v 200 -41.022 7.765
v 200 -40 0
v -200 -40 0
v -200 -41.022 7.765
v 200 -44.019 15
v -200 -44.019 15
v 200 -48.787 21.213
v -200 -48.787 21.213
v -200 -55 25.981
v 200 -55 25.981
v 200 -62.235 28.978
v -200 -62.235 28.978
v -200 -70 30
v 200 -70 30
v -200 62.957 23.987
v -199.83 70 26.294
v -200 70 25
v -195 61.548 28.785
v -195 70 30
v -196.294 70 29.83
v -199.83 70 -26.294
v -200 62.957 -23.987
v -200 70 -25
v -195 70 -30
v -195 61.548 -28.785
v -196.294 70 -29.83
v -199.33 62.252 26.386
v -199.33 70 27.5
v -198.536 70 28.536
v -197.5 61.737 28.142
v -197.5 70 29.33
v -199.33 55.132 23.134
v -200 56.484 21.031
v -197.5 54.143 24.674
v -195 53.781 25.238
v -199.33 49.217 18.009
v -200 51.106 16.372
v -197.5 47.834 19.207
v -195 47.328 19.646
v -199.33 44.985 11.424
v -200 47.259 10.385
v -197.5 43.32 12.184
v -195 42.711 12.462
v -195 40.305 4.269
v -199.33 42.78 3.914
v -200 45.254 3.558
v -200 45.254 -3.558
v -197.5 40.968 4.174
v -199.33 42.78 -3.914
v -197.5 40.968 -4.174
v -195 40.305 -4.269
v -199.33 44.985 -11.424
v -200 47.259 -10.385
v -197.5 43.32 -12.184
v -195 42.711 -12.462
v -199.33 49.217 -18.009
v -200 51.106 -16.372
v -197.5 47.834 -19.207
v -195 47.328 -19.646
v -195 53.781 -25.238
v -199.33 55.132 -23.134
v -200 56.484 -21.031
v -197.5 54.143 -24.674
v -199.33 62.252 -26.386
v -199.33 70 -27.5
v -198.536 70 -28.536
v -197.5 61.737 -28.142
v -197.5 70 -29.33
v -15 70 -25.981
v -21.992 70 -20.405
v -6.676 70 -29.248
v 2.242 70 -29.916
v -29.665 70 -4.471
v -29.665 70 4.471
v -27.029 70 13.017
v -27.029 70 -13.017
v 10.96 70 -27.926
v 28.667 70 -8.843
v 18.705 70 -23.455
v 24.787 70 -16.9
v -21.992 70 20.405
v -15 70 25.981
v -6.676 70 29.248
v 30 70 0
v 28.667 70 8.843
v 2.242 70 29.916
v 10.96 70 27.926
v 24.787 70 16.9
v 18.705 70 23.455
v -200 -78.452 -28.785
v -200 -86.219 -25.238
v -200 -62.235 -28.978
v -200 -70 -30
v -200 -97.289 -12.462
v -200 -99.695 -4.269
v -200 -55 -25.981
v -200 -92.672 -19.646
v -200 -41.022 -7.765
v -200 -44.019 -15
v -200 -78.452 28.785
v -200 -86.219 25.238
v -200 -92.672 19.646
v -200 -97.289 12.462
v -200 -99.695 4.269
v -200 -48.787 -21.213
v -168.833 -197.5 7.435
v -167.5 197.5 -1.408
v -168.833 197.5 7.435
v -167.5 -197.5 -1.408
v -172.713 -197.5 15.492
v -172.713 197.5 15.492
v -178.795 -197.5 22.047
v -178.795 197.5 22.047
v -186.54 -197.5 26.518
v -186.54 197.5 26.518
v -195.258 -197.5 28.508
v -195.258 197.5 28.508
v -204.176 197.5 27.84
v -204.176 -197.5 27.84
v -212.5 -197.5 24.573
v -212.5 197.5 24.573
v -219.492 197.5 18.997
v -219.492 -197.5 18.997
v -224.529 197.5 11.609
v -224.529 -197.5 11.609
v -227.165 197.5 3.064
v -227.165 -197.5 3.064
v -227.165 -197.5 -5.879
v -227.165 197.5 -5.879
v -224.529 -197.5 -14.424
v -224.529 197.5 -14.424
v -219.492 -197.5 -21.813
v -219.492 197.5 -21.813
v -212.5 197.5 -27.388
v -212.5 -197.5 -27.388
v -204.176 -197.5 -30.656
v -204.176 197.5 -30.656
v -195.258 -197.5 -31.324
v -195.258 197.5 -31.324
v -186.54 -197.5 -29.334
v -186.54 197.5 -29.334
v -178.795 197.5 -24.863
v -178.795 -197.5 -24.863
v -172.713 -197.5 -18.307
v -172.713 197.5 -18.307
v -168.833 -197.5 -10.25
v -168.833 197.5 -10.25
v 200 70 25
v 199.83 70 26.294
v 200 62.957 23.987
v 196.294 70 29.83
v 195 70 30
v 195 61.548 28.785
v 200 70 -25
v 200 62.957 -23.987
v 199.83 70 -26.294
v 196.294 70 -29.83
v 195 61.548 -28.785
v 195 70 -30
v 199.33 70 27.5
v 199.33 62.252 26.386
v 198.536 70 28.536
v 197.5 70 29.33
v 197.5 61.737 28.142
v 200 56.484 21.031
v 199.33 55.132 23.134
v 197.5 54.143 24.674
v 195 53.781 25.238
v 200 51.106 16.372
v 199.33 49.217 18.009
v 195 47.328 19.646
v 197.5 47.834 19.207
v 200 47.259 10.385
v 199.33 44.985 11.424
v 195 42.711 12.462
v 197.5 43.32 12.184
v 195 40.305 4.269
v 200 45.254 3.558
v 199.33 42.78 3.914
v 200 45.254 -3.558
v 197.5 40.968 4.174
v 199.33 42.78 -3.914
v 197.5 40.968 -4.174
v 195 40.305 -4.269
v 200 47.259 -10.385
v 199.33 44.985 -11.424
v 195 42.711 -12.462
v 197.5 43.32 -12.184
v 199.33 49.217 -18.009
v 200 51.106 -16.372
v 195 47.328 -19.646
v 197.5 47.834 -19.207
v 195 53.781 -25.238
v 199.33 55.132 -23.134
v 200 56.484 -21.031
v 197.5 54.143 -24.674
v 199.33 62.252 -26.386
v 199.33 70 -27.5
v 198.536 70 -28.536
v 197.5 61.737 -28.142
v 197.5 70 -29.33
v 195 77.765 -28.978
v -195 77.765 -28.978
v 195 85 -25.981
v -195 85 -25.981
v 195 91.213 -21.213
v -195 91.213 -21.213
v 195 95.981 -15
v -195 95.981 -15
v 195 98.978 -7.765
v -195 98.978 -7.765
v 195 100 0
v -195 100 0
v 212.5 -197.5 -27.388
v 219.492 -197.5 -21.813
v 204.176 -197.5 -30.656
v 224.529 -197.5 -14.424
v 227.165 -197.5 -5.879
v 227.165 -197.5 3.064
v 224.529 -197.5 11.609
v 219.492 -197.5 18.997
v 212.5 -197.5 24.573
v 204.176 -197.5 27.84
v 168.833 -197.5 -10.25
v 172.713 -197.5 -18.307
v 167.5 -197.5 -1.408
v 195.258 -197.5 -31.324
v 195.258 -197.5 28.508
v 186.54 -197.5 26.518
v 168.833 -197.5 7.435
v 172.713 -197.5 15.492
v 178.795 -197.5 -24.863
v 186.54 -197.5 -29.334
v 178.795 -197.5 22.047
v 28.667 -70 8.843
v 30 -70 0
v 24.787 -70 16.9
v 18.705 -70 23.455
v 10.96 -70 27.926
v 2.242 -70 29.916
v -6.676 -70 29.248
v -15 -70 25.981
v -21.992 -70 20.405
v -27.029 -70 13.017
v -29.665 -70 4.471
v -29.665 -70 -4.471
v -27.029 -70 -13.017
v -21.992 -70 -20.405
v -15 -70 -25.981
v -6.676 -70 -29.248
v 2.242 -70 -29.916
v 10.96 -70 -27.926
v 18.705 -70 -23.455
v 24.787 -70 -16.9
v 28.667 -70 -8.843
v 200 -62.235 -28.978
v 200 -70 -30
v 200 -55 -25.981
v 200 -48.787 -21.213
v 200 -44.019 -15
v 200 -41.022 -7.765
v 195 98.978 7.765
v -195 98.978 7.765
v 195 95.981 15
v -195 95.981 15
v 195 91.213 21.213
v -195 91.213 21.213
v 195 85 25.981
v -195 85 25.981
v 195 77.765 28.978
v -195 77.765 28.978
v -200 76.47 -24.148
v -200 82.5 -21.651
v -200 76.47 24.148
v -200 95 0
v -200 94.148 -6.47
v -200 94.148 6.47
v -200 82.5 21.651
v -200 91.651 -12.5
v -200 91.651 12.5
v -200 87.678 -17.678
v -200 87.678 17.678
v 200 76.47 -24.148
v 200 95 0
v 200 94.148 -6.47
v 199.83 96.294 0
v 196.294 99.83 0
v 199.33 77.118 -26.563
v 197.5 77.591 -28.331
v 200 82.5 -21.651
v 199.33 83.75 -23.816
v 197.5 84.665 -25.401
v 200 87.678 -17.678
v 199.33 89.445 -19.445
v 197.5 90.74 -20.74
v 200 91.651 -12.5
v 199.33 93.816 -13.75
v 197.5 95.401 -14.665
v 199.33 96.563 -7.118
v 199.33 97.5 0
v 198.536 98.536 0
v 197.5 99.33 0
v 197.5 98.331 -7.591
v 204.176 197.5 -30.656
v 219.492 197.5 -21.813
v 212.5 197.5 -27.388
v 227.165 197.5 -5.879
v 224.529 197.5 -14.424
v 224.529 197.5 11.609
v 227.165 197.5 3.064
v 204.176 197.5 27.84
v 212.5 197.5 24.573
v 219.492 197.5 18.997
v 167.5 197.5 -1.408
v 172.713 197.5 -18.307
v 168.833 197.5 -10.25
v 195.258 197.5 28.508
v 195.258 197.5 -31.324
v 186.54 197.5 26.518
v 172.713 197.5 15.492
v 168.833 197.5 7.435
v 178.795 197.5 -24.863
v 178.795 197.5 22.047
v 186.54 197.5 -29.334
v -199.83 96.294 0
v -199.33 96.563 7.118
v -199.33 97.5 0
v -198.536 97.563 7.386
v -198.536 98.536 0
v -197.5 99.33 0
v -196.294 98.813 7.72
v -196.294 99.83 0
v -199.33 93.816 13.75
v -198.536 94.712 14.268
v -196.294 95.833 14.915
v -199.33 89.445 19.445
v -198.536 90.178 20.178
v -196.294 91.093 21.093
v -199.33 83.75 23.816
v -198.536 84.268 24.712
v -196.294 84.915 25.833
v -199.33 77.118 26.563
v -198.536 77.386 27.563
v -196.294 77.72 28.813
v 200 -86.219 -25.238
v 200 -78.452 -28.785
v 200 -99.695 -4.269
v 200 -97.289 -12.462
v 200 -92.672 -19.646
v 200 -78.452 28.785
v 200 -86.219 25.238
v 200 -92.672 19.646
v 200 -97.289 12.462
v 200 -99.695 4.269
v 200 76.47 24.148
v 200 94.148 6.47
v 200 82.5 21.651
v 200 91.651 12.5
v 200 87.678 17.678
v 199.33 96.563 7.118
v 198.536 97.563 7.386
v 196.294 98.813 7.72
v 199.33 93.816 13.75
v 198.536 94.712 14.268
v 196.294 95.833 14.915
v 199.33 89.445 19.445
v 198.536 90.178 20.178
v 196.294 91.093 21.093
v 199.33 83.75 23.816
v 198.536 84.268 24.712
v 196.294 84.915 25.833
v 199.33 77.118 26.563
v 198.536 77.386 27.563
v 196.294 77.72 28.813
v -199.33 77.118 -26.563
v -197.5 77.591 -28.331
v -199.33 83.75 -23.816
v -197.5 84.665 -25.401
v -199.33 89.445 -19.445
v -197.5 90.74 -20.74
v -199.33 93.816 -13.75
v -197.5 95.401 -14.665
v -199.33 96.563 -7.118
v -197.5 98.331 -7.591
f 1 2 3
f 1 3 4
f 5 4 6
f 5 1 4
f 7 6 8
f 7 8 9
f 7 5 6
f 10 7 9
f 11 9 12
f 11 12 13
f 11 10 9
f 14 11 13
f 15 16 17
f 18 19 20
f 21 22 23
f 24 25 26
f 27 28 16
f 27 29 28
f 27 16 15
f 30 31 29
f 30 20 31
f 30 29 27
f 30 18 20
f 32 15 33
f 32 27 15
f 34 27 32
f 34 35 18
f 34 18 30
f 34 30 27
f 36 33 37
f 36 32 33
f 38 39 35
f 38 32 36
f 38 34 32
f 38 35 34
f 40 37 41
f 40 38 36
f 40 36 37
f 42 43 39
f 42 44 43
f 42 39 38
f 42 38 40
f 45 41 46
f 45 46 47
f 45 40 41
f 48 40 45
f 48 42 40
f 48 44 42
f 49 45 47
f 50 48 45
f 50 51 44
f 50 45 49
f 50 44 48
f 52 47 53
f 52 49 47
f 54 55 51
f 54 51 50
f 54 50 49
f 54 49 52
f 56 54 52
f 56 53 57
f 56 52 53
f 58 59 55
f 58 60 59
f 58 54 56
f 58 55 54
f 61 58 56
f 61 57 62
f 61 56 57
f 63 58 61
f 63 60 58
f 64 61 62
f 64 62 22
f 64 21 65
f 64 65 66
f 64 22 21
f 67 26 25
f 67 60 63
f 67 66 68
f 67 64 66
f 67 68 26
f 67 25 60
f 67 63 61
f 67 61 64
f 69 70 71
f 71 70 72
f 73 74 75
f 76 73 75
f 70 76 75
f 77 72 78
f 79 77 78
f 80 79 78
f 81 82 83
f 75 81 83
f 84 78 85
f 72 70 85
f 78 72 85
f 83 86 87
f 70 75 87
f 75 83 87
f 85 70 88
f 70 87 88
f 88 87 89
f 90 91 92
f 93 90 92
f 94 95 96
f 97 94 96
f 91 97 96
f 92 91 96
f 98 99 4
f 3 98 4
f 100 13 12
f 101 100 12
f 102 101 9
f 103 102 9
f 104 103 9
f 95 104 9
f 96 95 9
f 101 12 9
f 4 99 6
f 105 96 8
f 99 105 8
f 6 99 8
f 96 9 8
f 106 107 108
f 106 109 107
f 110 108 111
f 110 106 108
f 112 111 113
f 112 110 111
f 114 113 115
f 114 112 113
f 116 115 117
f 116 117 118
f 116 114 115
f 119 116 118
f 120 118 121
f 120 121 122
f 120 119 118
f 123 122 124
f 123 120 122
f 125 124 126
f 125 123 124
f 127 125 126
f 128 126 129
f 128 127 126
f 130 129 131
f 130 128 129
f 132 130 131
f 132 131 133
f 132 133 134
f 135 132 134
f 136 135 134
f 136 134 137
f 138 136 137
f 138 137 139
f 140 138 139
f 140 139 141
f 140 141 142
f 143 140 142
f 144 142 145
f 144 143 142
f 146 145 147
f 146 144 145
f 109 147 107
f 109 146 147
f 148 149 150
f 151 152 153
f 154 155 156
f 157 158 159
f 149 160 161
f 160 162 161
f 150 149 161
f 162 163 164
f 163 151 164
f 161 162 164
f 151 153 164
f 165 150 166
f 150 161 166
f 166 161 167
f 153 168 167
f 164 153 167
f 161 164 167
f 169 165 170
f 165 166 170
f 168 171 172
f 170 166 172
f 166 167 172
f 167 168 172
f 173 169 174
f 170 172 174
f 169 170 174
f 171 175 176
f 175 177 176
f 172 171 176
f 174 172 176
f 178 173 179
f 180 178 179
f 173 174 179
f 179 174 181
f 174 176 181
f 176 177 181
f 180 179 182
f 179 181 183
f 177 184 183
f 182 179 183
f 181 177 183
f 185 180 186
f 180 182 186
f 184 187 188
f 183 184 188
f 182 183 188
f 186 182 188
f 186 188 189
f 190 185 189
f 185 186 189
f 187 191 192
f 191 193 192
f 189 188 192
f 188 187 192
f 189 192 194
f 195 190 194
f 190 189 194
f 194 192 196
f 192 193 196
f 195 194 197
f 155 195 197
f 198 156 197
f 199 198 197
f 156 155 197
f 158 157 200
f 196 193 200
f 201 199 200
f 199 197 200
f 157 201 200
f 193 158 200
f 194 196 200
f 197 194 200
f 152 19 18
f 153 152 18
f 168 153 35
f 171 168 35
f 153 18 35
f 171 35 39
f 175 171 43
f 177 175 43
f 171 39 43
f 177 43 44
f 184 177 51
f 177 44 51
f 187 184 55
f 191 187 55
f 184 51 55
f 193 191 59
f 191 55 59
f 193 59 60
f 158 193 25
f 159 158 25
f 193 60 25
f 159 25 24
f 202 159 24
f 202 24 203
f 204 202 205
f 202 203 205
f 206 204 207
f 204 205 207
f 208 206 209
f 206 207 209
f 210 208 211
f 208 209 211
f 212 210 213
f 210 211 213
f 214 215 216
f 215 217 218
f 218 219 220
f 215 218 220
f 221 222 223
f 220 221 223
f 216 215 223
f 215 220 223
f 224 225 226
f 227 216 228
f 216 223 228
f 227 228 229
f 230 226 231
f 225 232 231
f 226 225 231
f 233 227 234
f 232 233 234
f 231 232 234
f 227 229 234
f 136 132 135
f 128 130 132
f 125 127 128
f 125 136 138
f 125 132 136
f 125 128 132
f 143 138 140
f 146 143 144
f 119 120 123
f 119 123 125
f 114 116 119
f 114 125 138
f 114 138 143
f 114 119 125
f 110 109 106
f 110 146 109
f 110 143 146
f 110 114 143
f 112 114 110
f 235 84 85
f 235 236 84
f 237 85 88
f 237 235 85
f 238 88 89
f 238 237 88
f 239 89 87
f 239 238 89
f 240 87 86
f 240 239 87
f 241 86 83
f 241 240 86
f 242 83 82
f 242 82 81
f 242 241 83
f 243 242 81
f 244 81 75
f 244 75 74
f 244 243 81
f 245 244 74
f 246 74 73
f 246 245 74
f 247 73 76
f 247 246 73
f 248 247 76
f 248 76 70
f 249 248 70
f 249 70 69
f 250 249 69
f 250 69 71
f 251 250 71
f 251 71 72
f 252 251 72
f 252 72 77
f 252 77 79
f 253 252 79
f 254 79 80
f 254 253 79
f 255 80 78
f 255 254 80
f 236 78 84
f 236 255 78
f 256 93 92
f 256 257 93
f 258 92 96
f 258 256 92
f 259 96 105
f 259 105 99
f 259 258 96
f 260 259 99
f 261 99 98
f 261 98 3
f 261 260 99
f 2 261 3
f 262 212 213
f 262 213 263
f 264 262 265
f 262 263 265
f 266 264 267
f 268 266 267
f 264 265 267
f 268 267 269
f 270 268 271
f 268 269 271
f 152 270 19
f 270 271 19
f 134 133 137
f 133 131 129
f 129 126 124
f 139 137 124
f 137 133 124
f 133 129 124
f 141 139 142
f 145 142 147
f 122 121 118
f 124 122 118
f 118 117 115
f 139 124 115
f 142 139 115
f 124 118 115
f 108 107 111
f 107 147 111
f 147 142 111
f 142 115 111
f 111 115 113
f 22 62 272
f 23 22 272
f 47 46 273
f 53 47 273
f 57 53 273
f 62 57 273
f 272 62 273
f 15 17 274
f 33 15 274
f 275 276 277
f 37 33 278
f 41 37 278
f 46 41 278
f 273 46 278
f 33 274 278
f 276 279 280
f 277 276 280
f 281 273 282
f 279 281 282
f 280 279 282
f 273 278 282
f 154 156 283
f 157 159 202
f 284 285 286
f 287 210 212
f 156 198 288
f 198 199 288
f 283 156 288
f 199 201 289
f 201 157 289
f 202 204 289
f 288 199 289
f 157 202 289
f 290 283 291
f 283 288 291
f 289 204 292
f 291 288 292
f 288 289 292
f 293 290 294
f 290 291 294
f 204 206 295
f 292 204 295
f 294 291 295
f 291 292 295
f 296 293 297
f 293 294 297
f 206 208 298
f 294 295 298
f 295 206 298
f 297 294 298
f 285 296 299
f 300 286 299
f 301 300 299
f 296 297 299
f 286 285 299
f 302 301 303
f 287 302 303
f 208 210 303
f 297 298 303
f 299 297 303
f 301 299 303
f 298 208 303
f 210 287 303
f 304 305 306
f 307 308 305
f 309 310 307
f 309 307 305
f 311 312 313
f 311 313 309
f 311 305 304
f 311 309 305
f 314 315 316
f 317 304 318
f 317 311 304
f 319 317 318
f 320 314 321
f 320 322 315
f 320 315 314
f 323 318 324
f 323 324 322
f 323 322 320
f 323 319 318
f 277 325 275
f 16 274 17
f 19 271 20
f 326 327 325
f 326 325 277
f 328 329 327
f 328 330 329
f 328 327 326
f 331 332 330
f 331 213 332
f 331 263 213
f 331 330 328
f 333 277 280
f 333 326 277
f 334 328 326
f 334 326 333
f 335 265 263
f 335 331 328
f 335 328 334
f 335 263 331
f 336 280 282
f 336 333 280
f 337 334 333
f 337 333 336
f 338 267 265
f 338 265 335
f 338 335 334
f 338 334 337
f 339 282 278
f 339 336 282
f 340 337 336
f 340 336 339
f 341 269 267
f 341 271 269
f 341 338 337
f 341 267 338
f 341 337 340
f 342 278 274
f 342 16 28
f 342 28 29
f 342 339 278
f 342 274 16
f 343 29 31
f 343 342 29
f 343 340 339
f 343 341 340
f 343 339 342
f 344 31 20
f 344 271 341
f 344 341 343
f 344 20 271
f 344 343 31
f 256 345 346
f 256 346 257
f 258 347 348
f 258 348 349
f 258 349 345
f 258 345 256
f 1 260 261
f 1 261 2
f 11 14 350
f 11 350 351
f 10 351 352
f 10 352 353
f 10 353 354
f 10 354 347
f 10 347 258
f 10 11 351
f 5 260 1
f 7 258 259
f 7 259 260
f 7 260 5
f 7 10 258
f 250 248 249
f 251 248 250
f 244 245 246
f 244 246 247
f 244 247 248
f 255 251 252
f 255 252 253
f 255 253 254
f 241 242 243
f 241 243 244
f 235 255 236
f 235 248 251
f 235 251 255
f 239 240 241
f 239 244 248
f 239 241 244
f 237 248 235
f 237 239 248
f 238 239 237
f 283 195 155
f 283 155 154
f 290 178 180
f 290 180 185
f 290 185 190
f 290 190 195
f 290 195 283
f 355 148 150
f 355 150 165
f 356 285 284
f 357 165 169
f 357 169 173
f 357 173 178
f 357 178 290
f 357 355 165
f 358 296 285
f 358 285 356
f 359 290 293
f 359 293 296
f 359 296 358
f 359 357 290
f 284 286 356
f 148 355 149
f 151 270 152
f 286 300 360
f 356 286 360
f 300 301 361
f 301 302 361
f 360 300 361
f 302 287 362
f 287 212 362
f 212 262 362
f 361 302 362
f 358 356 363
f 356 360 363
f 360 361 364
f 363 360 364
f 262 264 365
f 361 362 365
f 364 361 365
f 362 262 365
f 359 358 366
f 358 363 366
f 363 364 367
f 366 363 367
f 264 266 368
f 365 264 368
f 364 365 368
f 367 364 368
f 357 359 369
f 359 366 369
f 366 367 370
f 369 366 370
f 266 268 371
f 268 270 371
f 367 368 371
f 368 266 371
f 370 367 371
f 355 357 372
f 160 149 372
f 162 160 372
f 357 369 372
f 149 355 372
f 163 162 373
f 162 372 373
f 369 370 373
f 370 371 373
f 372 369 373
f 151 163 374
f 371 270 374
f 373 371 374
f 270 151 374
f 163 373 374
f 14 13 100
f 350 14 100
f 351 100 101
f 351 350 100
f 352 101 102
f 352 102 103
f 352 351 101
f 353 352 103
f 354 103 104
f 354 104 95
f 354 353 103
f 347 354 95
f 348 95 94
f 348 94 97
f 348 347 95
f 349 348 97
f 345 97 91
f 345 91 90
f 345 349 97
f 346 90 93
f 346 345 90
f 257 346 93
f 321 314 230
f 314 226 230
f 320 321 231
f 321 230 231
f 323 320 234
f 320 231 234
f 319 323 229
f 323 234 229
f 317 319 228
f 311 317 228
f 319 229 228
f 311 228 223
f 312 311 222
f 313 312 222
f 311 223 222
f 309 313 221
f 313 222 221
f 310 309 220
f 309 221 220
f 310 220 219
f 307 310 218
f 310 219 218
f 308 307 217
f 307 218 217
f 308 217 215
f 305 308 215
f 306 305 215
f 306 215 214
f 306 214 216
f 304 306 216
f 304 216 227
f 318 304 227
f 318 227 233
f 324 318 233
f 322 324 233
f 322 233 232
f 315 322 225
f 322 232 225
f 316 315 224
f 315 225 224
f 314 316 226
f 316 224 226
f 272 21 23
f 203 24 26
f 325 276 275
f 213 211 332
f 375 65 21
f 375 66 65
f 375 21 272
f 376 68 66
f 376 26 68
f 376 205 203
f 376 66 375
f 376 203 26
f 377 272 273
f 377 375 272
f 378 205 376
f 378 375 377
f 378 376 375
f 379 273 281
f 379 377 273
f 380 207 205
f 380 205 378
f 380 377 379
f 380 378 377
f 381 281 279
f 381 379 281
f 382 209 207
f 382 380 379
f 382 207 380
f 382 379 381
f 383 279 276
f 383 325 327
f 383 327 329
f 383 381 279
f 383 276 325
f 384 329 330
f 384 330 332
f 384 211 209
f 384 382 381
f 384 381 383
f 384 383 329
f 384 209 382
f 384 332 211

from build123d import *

# Parameters (mm, degrees)
F0_R     = 30
F1_DEPTH = 197.5
F2_DEPTH = 70
F5_DEPTH = 200
F6_R     = 5


with BuildPart() as f1:
    # F0 (on Front) → F1 (new body, symmetric)
    with BuildSketch(Plane.XZ):
        with Locations((-197.5, -1.407729)):
            Circle(F0_R)
    extrude(amount=F1_DEPTH, both=True)


with BuildPart() as f2:
    # F0 (on Front) → F2 (new body, symmetric)
    with BuildSketch(Plane.XZ):
        Circle(F0_R)
    extrude(amount=F2_DEPTH, both=True)


with BuildPart() as f3_1:
    # F3: instance of F1
    add(f1.part.mirror(Plane.YZ))


with BuildPart() as f5:
    # F4 (on Right) → F5 (new body, symmetric)
    with BuildSketch(Plane.YZ):
        with BuildLine():
            ThreePointArc((100, 0), (91.213203, 21.213203), (70, 30))
            Line((70, 30), (70, -30))
            ThreePointArc((70, -30), (91.213203, -21.213203), (100, 0))
        make_face()
        with BuildLine():
            Line((70, -30), (70, 30))
            ThreePointArc((70, 30), (40, 0), (70, -30))
        make_face()
        with BuildLine():
            Line((-70, 30), (-70, -30))
            ThreePointArc((-70, -30), (-48.786797, -21.213203), (-40, 0))
            ThreePointArc((-40, 0), (-48.786797, 21.213203), (-70, 30))
        make_face()
        with BuildLine():
            ThreePointArc((-70, 30), (-100, 0), (-70, -30))
            Line((-70, -30), (-70, 30))
        make_face()
    extrude(amount=F5_DEPTH, both=True)

    # F6
    f6_edges = [f5.edges().sort_by_distance(p)[0] for p in [
        (-100, 70, 30),
        (100, 70, 30),
        (-200, 40, 0),
        (100, 70, -30),
        (-100, 70, -30),
        (200, 40, 0),
    ]]
    fillet(f6_edges, radius=F6_R)


solid = Compound([f1.part, f2.part, f3_1.part, f5.part])
